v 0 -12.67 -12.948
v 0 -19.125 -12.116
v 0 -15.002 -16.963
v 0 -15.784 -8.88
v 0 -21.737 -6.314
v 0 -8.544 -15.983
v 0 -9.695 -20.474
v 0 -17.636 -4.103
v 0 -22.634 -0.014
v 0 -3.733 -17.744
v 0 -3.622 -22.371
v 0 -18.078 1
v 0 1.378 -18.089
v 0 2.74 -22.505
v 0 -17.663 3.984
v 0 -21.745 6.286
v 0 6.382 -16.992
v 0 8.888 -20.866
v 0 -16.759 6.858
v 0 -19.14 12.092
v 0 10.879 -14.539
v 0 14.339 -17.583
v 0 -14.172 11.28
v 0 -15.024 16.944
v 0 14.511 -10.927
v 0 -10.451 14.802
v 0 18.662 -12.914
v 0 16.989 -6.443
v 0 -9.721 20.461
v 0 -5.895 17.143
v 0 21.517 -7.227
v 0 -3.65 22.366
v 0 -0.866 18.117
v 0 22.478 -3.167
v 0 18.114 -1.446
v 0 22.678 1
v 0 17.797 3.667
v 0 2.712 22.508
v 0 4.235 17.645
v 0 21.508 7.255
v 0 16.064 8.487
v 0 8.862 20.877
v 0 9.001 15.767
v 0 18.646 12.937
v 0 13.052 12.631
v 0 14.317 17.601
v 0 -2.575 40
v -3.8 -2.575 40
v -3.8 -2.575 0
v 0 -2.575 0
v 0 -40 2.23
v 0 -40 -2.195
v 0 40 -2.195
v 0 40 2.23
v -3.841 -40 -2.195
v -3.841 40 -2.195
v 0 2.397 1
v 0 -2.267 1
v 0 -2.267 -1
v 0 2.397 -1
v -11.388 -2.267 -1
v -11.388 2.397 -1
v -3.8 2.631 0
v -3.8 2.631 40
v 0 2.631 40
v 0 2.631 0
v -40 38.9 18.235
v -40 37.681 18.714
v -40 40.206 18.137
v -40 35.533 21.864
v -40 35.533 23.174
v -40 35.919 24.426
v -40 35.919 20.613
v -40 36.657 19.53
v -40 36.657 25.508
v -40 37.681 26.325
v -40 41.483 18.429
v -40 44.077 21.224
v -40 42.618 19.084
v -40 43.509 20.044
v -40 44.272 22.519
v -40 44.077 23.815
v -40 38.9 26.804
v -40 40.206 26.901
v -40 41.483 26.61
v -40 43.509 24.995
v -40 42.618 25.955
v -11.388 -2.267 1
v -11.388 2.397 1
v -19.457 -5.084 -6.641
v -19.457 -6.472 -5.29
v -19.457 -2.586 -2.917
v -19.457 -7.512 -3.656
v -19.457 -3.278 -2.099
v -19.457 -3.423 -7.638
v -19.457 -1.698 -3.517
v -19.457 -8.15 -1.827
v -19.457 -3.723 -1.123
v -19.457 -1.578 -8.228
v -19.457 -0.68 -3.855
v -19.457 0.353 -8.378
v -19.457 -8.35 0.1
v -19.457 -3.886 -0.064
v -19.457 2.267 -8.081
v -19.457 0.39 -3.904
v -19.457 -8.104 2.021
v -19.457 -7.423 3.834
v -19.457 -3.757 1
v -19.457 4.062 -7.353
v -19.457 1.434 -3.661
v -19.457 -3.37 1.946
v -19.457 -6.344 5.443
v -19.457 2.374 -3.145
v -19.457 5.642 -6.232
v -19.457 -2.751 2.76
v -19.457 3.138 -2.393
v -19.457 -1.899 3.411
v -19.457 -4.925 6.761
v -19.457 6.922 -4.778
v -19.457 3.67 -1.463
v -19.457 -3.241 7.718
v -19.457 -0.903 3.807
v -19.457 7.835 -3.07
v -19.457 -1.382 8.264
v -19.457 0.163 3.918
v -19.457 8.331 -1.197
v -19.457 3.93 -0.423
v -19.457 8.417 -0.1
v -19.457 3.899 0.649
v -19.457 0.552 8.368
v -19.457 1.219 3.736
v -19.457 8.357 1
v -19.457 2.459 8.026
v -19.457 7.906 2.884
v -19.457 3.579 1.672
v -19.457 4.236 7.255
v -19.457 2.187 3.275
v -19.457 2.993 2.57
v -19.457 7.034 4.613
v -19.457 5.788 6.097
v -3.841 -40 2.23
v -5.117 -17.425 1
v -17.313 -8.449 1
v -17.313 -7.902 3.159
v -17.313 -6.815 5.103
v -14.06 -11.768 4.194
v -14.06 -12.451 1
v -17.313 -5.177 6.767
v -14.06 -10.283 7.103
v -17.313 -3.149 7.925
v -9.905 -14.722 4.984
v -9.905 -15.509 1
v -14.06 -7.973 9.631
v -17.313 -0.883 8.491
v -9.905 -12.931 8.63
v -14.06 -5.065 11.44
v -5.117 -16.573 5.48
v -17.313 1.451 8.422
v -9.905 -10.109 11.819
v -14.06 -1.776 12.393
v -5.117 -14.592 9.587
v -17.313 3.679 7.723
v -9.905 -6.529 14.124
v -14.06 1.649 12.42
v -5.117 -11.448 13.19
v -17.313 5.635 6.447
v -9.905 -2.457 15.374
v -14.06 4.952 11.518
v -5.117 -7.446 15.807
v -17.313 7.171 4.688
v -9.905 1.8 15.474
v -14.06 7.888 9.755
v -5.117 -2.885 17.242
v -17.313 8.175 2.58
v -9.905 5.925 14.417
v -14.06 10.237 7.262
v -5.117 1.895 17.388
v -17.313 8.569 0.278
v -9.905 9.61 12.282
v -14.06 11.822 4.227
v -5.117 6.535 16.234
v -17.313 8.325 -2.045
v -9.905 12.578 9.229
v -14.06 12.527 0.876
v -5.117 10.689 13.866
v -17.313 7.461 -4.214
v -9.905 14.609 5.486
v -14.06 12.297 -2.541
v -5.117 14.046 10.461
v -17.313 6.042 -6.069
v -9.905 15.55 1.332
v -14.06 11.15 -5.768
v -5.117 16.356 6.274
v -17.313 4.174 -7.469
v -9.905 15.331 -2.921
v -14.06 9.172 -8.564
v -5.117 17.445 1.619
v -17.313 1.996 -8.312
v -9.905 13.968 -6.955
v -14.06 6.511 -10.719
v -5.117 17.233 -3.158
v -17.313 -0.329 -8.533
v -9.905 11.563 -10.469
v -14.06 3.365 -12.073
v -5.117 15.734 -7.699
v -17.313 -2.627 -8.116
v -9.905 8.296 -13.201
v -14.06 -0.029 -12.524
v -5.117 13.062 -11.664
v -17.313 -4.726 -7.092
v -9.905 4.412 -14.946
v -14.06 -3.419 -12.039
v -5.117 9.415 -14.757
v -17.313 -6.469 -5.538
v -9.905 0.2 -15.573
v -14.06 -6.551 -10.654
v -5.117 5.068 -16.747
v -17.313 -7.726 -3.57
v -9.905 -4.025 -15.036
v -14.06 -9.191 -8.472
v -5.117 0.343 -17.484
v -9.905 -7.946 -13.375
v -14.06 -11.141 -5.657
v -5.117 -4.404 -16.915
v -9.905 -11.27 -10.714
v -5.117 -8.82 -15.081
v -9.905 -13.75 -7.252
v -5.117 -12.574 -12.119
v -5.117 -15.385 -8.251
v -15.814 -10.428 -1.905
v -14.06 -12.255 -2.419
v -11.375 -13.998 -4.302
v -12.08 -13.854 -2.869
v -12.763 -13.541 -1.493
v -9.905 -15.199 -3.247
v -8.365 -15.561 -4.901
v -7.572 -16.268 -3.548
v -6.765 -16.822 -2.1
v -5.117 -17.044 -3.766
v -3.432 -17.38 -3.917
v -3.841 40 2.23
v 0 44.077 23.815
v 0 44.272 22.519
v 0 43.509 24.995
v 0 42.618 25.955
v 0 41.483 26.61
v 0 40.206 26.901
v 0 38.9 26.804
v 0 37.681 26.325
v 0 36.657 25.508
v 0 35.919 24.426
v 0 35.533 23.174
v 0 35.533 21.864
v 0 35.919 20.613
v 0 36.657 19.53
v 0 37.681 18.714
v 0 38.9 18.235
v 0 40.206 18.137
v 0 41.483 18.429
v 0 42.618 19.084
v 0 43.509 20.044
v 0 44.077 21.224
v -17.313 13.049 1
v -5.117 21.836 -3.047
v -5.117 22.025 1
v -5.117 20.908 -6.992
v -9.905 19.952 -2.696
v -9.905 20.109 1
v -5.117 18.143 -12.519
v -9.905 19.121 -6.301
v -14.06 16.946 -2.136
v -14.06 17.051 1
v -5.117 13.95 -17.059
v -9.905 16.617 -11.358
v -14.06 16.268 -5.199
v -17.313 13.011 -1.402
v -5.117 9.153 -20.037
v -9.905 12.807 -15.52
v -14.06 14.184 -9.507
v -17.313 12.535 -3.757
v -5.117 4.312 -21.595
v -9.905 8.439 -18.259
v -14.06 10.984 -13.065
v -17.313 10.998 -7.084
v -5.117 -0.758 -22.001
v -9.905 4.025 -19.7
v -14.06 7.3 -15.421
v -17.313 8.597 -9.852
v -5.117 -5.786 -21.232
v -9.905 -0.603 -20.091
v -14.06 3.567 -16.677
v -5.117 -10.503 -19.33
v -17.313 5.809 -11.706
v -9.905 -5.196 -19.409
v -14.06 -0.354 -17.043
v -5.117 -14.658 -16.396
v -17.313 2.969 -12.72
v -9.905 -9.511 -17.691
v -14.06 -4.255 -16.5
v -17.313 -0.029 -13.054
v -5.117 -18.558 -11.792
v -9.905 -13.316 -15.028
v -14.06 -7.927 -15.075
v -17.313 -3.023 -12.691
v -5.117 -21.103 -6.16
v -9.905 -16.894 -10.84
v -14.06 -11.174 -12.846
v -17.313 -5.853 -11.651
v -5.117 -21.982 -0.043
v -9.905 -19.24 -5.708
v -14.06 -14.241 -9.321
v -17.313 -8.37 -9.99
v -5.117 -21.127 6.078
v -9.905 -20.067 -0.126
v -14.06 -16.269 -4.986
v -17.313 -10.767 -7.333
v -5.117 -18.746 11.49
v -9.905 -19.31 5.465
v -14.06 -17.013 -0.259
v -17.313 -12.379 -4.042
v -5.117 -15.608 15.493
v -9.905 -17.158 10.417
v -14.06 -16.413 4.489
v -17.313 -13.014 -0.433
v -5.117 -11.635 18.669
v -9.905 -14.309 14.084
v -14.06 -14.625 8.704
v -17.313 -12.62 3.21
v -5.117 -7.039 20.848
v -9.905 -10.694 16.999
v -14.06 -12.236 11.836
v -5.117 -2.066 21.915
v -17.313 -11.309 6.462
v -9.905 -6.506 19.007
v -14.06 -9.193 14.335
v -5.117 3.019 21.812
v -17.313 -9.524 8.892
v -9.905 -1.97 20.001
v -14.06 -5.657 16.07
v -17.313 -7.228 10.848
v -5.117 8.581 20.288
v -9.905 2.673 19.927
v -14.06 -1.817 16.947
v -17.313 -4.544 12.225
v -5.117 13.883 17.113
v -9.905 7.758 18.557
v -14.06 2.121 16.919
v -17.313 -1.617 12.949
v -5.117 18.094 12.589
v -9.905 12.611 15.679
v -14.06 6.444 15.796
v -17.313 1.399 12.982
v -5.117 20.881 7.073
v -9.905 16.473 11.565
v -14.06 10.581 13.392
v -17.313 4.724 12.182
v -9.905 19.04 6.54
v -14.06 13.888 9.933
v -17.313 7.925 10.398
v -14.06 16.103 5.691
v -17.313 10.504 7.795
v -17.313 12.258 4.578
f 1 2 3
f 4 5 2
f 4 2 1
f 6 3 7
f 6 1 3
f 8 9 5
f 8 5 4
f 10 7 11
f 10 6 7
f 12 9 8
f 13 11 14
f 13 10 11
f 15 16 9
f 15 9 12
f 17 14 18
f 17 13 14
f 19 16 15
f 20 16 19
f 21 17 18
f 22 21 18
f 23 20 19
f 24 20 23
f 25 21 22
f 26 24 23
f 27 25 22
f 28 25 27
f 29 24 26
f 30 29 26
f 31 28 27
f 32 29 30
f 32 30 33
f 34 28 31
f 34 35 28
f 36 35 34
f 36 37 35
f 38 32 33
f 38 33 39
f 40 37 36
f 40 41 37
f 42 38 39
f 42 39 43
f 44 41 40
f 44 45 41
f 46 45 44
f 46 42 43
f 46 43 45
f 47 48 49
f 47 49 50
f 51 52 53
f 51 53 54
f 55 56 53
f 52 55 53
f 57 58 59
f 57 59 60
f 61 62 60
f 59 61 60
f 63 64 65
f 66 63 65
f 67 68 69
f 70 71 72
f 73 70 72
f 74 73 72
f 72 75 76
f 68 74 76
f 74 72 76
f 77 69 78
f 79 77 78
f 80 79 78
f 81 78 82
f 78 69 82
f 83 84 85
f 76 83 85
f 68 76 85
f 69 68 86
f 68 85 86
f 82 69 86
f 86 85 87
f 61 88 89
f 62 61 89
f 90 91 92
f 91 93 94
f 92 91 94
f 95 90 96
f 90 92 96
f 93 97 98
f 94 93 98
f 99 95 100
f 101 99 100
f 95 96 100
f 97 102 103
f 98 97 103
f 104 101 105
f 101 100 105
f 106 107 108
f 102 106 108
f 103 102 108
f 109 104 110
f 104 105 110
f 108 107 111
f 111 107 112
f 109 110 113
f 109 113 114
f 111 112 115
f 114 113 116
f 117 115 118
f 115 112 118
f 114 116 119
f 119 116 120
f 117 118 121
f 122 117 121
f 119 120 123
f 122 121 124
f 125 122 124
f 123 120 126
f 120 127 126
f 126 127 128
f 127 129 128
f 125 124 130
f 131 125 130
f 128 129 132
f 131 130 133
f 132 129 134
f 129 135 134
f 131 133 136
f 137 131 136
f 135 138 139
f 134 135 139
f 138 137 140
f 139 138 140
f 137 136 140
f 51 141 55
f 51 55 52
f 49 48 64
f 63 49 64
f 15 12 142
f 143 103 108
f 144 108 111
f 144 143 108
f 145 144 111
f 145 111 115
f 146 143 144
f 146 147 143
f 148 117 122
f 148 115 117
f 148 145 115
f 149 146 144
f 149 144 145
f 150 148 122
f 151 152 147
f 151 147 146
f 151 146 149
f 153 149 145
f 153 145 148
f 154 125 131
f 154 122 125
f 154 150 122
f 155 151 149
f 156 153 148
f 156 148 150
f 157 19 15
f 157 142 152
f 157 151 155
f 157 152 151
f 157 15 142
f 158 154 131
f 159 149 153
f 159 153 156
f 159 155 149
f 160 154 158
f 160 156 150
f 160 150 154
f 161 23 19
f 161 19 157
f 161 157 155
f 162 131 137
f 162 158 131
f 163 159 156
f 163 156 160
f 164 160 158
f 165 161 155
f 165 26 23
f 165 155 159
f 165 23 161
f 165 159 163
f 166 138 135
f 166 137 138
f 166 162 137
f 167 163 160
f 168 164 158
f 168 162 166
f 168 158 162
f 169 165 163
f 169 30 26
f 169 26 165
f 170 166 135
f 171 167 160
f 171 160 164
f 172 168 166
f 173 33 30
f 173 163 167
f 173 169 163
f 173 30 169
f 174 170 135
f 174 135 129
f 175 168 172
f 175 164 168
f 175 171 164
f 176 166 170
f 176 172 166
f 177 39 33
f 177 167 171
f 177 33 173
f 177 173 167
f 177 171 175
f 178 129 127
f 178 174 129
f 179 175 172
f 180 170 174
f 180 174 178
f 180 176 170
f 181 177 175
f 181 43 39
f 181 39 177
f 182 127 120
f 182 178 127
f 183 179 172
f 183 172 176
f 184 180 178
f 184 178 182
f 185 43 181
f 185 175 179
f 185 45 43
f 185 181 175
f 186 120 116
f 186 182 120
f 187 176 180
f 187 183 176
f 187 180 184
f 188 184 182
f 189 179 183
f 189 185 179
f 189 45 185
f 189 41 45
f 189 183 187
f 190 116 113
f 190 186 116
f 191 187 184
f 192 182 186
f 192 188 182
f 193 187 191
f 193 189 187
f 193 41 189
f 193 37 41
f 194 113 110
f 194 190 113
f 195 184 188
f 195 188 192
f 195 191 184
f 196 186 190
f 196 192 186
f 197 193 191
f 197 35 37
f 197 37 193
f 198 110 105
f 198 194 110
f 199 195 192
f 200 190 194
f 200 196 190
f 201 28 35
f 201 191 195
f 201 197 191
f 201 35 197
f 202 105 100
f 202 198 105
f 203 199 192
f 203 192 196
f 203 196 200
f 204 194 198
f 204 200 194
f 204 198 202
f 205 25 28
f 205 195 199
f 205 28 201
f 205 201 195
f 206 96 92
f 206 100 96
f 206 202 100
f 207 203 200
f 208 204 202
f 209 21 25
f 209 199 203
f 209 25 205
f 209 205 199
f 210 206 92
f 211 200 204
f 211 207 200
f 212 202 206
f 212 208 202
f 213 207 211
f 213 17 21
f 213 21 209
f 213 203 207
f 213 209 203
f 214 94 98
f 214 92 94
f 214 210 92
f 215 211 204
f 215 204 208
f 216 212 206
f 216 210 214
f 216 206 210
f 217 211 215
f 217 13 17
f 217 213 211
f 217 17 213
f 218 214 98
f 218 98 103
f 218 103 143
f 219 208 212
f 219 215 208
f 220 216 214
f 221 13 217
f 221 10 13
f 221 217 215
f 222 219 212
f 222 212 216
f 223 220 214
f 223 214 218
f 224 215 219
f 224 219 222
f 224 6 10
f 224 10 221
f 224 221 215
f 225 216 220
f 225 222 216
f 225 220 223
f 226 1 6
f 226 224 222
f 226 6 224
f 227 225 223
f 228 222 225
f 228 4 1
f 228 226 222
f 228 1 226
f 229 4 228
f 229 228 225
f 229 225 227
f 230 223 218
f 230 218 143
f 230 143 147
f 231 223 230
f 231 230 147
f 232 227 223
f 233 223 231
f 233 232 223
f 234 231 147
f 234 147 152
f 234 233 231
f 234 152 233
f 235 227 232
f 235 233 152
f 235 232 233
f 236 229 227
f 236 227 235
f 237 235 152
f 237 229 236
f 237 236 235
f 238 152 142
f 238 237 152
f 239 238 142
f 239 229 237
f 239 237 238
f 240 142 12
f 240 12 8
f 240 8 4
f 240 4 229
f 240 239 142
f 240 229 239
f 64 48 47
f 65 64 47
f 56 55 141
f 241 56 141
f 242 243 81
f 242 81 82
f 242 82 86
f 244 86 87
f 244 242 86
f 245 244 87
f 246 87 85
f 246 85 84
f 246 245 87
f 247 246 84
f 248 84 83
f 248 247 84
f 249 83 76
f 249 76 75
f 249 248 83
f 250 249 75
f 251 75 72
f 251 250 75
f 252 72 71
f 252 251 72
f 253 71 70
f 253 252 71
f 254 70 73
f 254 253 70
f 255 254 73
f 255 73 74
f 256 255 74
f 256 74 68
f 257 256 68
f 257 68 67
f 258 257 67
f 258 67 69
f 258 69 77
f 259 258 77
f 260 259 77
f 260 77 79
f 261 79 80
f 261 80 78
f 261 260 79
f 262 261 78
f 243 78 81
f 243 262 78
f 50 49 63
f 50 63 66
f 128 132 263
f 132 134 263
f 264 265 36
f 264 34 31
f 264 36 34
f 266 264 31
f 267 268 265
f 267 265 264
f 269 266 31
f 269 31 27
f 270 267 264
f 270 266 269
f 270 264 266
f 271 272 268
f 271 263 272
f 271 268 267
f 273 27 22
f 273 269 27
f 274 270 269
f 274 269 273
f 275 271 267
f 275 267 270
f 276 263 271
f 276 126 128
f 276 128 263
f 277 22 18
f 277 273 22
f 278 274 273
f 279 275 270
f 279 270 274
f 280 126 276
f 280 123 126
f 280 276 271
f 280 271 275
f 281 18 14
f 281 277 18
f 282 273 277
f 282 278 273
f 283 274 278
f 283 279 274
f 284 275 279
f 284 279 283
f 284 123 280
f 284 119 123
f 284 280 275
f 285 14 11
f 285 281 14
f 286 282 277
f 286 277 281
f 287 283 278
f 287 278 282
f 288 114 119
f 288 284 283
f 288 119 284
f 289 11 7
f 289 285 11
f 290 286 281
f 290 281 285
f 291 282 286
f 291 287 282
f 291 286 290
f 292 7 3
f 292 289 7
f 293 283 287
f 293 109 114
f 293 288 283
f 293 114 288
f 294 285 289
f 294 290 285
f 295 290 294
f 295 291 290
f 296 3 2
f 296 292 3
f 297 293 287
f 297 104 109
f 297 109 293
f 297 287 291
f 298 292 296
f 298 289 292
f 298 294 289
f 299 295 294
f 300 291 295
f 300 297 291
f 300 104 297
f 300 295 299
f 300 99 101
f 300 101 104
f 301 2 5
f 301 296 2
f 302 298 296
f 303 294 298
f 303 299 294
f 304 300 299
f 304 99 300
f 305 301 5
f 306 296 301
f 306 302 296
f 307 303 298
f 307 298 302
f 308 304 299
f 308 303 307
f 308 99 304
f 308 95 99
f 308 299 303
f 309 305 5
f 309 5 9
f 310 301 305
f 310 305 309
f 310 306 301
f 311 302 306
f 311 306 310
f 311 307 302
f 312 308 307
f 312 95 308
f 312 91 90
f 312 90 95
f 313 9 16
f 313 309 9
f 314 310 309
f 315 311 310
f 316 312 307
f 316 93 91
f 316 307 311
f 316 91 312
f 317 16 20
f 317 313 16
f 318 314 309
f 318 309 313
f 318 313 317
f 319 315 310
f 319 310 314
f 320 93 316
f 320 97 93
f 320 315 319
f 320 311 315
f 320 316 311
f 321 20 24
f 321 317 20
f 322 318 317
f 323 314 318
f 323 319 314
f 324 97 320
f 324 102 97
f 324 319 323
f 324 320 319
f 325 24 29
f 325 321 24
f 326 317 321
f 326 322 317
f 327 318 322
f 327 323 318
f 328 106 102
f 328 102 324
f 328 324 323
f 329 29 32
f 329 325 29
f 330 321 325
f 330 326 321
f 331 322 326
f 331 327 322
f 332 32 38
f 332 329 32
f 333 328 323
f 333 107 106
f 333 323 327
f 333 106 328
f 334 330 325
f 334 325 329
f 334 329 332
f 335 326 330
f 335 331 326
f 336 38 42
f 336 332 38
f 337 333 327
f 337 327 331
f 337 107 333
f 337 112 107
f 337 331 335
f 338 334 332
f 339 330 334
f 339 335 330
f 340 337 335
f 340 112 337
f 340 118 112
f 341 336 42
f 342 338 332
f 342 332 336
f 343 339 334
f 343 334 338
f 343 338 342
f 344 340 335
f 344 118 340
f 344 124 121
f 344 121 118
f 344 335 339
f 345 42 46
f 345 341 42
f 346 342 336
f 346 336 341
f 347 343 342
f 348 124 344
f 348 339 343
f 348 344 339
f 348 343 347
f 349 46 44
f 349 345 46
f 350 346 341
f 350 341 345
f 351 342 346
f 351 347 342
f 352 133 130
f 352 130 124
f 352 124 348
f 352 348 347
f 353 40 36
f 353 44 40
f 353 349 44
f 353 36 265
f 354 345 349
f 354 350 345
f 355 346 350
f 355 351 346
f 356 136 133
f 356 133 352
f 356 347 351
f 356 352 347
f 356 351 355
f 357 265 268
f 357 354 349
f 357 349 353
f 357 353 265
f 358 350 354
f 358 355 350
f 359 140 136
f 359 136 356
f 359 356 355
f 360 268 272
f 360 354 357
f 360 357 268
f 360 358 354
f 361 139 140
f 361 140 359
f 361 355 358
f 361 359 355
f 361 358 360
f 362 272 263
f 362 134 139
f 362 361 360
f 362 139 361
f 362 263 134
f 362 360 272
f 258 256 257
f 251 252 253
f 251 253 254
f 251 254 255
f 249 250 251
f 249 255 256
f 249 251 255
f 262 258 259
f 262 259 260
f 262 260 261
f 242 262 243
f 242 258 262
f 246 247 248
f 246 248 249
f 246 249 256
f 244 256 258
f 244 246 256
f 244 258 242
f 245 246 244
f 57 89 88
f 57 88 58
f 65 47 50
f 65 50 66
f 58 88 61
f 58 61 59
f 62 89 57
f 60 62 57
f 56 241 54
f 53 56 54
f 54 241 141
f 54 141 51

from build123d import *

# Parameters (mm, degrees)
F1_W      = 21.1188904941
F1_H      = 4.6637551859
F2_DEPTH  = 1
F0_R      = 20.3782812444
F4_W      = 29.2367804796
F4_H      = 57.13144131
F5_DEPTH  = 25
F6_W      = 3.8408043329
F6_H      = 4.4252569787
F7_DEPTH  = 40
F8_W      = 3.8002075162
F8_H      = 5.2054570988
F9_DEPTH  = 40
F12_W     = 8.9062079787
F12_H     = 25.4112929106
F13_DEPTH = 12.5
F14_R     = 4.3943907086
F15_DEPTH = 40


with BuildPart() as f2:
    # F1 (on Top) → F2 (new body, symmetric)
    with BuildSketch(Plane.XY):
        with Locations((-0.8285054937, 0.064924825)):
            Rectangle(F1_W, F1_H)
    extrude(amount=F2_DEPTH, both=True)


with BuildPart() as f3:
    # F0 (on Top) → F3 (revolve)
    with BuildSketch(Plane.XY):
        Circle(F0_R)
    revolve(axis=Axis((-0.8285054937, -2.266952768, -1), (-1, 0, 0)))


with BuildPart() as f5_tool:
    # F4 (on Top) → F5 (new body, symmetric)
    with BuildSketch(Plane.XY):
        with Locations((14.6183902398, -2.2337837145)):
            Rectangle(F4_W, F4_H)
    extrude(amount=F5_DEPTH, both=True)


with BuildPart() as f2_1:
    add(f2.part)

    # F5: cut by f5_tool
    add(f5_tool.part, mode=Mode.SUBTRACT)


with BuildPart() as f3_1:
    add(f3.part)

    # F5: cut by f5_tool
    add(f5_tool.part, mode=Mode.SUBTRACT)


with BuildPart() as f7:
    # F6 (on Front) → F7 (new body, symmetric)
    with BuildSketch(Plane.XZ):
        with Locations((-1.9204021664, 0.0174918678)):
            Rectangle(F6_W, F6_H)
    extrude(amount=F7_DEPTH, both=True)


with BuildPart() as f9:
    # F8 (on Top) → F9 (new body)
    with BuildSketch(Plane.XY):
        with Locations((-1.9001037581, 0.0281946268)):
            Rectangle(F8_W, F8_H)
    extrude(amount=F9_DEPTH)


with BuildPart() as f3_2:
    # F10: moved
    add(f3_1.part.moved(Location((0, 2.3, 0))))


with BuildPart() as f3_3:
    # F11: moved
    add(f3_2.part.moved(Location((0, 0, 1))))

    # F12 (on Top) → F13 (cut, symmetric)
    with BuildSketch(Plane.XY):
        with Locations((-23.9103324711, -1.2943558395)):
            Rectangle(F12_W, F12_H)
    extrude(amount=F13_DEPTH, both=True, mode=Mode.SUBTRACT)


with BuildPart() as f15:
    # F14 (on Right) → F15 (new body)
    with BuildSketch(Plane.YZ):
        with Locations((39.8779436946, 22.5193239748)):
            Circle(F14_R)
    extrude(amount=-F15_DEPTH)


solid = Compound([f2_1.part, f7.part, f9.part, f3_3.part, f15.part])
